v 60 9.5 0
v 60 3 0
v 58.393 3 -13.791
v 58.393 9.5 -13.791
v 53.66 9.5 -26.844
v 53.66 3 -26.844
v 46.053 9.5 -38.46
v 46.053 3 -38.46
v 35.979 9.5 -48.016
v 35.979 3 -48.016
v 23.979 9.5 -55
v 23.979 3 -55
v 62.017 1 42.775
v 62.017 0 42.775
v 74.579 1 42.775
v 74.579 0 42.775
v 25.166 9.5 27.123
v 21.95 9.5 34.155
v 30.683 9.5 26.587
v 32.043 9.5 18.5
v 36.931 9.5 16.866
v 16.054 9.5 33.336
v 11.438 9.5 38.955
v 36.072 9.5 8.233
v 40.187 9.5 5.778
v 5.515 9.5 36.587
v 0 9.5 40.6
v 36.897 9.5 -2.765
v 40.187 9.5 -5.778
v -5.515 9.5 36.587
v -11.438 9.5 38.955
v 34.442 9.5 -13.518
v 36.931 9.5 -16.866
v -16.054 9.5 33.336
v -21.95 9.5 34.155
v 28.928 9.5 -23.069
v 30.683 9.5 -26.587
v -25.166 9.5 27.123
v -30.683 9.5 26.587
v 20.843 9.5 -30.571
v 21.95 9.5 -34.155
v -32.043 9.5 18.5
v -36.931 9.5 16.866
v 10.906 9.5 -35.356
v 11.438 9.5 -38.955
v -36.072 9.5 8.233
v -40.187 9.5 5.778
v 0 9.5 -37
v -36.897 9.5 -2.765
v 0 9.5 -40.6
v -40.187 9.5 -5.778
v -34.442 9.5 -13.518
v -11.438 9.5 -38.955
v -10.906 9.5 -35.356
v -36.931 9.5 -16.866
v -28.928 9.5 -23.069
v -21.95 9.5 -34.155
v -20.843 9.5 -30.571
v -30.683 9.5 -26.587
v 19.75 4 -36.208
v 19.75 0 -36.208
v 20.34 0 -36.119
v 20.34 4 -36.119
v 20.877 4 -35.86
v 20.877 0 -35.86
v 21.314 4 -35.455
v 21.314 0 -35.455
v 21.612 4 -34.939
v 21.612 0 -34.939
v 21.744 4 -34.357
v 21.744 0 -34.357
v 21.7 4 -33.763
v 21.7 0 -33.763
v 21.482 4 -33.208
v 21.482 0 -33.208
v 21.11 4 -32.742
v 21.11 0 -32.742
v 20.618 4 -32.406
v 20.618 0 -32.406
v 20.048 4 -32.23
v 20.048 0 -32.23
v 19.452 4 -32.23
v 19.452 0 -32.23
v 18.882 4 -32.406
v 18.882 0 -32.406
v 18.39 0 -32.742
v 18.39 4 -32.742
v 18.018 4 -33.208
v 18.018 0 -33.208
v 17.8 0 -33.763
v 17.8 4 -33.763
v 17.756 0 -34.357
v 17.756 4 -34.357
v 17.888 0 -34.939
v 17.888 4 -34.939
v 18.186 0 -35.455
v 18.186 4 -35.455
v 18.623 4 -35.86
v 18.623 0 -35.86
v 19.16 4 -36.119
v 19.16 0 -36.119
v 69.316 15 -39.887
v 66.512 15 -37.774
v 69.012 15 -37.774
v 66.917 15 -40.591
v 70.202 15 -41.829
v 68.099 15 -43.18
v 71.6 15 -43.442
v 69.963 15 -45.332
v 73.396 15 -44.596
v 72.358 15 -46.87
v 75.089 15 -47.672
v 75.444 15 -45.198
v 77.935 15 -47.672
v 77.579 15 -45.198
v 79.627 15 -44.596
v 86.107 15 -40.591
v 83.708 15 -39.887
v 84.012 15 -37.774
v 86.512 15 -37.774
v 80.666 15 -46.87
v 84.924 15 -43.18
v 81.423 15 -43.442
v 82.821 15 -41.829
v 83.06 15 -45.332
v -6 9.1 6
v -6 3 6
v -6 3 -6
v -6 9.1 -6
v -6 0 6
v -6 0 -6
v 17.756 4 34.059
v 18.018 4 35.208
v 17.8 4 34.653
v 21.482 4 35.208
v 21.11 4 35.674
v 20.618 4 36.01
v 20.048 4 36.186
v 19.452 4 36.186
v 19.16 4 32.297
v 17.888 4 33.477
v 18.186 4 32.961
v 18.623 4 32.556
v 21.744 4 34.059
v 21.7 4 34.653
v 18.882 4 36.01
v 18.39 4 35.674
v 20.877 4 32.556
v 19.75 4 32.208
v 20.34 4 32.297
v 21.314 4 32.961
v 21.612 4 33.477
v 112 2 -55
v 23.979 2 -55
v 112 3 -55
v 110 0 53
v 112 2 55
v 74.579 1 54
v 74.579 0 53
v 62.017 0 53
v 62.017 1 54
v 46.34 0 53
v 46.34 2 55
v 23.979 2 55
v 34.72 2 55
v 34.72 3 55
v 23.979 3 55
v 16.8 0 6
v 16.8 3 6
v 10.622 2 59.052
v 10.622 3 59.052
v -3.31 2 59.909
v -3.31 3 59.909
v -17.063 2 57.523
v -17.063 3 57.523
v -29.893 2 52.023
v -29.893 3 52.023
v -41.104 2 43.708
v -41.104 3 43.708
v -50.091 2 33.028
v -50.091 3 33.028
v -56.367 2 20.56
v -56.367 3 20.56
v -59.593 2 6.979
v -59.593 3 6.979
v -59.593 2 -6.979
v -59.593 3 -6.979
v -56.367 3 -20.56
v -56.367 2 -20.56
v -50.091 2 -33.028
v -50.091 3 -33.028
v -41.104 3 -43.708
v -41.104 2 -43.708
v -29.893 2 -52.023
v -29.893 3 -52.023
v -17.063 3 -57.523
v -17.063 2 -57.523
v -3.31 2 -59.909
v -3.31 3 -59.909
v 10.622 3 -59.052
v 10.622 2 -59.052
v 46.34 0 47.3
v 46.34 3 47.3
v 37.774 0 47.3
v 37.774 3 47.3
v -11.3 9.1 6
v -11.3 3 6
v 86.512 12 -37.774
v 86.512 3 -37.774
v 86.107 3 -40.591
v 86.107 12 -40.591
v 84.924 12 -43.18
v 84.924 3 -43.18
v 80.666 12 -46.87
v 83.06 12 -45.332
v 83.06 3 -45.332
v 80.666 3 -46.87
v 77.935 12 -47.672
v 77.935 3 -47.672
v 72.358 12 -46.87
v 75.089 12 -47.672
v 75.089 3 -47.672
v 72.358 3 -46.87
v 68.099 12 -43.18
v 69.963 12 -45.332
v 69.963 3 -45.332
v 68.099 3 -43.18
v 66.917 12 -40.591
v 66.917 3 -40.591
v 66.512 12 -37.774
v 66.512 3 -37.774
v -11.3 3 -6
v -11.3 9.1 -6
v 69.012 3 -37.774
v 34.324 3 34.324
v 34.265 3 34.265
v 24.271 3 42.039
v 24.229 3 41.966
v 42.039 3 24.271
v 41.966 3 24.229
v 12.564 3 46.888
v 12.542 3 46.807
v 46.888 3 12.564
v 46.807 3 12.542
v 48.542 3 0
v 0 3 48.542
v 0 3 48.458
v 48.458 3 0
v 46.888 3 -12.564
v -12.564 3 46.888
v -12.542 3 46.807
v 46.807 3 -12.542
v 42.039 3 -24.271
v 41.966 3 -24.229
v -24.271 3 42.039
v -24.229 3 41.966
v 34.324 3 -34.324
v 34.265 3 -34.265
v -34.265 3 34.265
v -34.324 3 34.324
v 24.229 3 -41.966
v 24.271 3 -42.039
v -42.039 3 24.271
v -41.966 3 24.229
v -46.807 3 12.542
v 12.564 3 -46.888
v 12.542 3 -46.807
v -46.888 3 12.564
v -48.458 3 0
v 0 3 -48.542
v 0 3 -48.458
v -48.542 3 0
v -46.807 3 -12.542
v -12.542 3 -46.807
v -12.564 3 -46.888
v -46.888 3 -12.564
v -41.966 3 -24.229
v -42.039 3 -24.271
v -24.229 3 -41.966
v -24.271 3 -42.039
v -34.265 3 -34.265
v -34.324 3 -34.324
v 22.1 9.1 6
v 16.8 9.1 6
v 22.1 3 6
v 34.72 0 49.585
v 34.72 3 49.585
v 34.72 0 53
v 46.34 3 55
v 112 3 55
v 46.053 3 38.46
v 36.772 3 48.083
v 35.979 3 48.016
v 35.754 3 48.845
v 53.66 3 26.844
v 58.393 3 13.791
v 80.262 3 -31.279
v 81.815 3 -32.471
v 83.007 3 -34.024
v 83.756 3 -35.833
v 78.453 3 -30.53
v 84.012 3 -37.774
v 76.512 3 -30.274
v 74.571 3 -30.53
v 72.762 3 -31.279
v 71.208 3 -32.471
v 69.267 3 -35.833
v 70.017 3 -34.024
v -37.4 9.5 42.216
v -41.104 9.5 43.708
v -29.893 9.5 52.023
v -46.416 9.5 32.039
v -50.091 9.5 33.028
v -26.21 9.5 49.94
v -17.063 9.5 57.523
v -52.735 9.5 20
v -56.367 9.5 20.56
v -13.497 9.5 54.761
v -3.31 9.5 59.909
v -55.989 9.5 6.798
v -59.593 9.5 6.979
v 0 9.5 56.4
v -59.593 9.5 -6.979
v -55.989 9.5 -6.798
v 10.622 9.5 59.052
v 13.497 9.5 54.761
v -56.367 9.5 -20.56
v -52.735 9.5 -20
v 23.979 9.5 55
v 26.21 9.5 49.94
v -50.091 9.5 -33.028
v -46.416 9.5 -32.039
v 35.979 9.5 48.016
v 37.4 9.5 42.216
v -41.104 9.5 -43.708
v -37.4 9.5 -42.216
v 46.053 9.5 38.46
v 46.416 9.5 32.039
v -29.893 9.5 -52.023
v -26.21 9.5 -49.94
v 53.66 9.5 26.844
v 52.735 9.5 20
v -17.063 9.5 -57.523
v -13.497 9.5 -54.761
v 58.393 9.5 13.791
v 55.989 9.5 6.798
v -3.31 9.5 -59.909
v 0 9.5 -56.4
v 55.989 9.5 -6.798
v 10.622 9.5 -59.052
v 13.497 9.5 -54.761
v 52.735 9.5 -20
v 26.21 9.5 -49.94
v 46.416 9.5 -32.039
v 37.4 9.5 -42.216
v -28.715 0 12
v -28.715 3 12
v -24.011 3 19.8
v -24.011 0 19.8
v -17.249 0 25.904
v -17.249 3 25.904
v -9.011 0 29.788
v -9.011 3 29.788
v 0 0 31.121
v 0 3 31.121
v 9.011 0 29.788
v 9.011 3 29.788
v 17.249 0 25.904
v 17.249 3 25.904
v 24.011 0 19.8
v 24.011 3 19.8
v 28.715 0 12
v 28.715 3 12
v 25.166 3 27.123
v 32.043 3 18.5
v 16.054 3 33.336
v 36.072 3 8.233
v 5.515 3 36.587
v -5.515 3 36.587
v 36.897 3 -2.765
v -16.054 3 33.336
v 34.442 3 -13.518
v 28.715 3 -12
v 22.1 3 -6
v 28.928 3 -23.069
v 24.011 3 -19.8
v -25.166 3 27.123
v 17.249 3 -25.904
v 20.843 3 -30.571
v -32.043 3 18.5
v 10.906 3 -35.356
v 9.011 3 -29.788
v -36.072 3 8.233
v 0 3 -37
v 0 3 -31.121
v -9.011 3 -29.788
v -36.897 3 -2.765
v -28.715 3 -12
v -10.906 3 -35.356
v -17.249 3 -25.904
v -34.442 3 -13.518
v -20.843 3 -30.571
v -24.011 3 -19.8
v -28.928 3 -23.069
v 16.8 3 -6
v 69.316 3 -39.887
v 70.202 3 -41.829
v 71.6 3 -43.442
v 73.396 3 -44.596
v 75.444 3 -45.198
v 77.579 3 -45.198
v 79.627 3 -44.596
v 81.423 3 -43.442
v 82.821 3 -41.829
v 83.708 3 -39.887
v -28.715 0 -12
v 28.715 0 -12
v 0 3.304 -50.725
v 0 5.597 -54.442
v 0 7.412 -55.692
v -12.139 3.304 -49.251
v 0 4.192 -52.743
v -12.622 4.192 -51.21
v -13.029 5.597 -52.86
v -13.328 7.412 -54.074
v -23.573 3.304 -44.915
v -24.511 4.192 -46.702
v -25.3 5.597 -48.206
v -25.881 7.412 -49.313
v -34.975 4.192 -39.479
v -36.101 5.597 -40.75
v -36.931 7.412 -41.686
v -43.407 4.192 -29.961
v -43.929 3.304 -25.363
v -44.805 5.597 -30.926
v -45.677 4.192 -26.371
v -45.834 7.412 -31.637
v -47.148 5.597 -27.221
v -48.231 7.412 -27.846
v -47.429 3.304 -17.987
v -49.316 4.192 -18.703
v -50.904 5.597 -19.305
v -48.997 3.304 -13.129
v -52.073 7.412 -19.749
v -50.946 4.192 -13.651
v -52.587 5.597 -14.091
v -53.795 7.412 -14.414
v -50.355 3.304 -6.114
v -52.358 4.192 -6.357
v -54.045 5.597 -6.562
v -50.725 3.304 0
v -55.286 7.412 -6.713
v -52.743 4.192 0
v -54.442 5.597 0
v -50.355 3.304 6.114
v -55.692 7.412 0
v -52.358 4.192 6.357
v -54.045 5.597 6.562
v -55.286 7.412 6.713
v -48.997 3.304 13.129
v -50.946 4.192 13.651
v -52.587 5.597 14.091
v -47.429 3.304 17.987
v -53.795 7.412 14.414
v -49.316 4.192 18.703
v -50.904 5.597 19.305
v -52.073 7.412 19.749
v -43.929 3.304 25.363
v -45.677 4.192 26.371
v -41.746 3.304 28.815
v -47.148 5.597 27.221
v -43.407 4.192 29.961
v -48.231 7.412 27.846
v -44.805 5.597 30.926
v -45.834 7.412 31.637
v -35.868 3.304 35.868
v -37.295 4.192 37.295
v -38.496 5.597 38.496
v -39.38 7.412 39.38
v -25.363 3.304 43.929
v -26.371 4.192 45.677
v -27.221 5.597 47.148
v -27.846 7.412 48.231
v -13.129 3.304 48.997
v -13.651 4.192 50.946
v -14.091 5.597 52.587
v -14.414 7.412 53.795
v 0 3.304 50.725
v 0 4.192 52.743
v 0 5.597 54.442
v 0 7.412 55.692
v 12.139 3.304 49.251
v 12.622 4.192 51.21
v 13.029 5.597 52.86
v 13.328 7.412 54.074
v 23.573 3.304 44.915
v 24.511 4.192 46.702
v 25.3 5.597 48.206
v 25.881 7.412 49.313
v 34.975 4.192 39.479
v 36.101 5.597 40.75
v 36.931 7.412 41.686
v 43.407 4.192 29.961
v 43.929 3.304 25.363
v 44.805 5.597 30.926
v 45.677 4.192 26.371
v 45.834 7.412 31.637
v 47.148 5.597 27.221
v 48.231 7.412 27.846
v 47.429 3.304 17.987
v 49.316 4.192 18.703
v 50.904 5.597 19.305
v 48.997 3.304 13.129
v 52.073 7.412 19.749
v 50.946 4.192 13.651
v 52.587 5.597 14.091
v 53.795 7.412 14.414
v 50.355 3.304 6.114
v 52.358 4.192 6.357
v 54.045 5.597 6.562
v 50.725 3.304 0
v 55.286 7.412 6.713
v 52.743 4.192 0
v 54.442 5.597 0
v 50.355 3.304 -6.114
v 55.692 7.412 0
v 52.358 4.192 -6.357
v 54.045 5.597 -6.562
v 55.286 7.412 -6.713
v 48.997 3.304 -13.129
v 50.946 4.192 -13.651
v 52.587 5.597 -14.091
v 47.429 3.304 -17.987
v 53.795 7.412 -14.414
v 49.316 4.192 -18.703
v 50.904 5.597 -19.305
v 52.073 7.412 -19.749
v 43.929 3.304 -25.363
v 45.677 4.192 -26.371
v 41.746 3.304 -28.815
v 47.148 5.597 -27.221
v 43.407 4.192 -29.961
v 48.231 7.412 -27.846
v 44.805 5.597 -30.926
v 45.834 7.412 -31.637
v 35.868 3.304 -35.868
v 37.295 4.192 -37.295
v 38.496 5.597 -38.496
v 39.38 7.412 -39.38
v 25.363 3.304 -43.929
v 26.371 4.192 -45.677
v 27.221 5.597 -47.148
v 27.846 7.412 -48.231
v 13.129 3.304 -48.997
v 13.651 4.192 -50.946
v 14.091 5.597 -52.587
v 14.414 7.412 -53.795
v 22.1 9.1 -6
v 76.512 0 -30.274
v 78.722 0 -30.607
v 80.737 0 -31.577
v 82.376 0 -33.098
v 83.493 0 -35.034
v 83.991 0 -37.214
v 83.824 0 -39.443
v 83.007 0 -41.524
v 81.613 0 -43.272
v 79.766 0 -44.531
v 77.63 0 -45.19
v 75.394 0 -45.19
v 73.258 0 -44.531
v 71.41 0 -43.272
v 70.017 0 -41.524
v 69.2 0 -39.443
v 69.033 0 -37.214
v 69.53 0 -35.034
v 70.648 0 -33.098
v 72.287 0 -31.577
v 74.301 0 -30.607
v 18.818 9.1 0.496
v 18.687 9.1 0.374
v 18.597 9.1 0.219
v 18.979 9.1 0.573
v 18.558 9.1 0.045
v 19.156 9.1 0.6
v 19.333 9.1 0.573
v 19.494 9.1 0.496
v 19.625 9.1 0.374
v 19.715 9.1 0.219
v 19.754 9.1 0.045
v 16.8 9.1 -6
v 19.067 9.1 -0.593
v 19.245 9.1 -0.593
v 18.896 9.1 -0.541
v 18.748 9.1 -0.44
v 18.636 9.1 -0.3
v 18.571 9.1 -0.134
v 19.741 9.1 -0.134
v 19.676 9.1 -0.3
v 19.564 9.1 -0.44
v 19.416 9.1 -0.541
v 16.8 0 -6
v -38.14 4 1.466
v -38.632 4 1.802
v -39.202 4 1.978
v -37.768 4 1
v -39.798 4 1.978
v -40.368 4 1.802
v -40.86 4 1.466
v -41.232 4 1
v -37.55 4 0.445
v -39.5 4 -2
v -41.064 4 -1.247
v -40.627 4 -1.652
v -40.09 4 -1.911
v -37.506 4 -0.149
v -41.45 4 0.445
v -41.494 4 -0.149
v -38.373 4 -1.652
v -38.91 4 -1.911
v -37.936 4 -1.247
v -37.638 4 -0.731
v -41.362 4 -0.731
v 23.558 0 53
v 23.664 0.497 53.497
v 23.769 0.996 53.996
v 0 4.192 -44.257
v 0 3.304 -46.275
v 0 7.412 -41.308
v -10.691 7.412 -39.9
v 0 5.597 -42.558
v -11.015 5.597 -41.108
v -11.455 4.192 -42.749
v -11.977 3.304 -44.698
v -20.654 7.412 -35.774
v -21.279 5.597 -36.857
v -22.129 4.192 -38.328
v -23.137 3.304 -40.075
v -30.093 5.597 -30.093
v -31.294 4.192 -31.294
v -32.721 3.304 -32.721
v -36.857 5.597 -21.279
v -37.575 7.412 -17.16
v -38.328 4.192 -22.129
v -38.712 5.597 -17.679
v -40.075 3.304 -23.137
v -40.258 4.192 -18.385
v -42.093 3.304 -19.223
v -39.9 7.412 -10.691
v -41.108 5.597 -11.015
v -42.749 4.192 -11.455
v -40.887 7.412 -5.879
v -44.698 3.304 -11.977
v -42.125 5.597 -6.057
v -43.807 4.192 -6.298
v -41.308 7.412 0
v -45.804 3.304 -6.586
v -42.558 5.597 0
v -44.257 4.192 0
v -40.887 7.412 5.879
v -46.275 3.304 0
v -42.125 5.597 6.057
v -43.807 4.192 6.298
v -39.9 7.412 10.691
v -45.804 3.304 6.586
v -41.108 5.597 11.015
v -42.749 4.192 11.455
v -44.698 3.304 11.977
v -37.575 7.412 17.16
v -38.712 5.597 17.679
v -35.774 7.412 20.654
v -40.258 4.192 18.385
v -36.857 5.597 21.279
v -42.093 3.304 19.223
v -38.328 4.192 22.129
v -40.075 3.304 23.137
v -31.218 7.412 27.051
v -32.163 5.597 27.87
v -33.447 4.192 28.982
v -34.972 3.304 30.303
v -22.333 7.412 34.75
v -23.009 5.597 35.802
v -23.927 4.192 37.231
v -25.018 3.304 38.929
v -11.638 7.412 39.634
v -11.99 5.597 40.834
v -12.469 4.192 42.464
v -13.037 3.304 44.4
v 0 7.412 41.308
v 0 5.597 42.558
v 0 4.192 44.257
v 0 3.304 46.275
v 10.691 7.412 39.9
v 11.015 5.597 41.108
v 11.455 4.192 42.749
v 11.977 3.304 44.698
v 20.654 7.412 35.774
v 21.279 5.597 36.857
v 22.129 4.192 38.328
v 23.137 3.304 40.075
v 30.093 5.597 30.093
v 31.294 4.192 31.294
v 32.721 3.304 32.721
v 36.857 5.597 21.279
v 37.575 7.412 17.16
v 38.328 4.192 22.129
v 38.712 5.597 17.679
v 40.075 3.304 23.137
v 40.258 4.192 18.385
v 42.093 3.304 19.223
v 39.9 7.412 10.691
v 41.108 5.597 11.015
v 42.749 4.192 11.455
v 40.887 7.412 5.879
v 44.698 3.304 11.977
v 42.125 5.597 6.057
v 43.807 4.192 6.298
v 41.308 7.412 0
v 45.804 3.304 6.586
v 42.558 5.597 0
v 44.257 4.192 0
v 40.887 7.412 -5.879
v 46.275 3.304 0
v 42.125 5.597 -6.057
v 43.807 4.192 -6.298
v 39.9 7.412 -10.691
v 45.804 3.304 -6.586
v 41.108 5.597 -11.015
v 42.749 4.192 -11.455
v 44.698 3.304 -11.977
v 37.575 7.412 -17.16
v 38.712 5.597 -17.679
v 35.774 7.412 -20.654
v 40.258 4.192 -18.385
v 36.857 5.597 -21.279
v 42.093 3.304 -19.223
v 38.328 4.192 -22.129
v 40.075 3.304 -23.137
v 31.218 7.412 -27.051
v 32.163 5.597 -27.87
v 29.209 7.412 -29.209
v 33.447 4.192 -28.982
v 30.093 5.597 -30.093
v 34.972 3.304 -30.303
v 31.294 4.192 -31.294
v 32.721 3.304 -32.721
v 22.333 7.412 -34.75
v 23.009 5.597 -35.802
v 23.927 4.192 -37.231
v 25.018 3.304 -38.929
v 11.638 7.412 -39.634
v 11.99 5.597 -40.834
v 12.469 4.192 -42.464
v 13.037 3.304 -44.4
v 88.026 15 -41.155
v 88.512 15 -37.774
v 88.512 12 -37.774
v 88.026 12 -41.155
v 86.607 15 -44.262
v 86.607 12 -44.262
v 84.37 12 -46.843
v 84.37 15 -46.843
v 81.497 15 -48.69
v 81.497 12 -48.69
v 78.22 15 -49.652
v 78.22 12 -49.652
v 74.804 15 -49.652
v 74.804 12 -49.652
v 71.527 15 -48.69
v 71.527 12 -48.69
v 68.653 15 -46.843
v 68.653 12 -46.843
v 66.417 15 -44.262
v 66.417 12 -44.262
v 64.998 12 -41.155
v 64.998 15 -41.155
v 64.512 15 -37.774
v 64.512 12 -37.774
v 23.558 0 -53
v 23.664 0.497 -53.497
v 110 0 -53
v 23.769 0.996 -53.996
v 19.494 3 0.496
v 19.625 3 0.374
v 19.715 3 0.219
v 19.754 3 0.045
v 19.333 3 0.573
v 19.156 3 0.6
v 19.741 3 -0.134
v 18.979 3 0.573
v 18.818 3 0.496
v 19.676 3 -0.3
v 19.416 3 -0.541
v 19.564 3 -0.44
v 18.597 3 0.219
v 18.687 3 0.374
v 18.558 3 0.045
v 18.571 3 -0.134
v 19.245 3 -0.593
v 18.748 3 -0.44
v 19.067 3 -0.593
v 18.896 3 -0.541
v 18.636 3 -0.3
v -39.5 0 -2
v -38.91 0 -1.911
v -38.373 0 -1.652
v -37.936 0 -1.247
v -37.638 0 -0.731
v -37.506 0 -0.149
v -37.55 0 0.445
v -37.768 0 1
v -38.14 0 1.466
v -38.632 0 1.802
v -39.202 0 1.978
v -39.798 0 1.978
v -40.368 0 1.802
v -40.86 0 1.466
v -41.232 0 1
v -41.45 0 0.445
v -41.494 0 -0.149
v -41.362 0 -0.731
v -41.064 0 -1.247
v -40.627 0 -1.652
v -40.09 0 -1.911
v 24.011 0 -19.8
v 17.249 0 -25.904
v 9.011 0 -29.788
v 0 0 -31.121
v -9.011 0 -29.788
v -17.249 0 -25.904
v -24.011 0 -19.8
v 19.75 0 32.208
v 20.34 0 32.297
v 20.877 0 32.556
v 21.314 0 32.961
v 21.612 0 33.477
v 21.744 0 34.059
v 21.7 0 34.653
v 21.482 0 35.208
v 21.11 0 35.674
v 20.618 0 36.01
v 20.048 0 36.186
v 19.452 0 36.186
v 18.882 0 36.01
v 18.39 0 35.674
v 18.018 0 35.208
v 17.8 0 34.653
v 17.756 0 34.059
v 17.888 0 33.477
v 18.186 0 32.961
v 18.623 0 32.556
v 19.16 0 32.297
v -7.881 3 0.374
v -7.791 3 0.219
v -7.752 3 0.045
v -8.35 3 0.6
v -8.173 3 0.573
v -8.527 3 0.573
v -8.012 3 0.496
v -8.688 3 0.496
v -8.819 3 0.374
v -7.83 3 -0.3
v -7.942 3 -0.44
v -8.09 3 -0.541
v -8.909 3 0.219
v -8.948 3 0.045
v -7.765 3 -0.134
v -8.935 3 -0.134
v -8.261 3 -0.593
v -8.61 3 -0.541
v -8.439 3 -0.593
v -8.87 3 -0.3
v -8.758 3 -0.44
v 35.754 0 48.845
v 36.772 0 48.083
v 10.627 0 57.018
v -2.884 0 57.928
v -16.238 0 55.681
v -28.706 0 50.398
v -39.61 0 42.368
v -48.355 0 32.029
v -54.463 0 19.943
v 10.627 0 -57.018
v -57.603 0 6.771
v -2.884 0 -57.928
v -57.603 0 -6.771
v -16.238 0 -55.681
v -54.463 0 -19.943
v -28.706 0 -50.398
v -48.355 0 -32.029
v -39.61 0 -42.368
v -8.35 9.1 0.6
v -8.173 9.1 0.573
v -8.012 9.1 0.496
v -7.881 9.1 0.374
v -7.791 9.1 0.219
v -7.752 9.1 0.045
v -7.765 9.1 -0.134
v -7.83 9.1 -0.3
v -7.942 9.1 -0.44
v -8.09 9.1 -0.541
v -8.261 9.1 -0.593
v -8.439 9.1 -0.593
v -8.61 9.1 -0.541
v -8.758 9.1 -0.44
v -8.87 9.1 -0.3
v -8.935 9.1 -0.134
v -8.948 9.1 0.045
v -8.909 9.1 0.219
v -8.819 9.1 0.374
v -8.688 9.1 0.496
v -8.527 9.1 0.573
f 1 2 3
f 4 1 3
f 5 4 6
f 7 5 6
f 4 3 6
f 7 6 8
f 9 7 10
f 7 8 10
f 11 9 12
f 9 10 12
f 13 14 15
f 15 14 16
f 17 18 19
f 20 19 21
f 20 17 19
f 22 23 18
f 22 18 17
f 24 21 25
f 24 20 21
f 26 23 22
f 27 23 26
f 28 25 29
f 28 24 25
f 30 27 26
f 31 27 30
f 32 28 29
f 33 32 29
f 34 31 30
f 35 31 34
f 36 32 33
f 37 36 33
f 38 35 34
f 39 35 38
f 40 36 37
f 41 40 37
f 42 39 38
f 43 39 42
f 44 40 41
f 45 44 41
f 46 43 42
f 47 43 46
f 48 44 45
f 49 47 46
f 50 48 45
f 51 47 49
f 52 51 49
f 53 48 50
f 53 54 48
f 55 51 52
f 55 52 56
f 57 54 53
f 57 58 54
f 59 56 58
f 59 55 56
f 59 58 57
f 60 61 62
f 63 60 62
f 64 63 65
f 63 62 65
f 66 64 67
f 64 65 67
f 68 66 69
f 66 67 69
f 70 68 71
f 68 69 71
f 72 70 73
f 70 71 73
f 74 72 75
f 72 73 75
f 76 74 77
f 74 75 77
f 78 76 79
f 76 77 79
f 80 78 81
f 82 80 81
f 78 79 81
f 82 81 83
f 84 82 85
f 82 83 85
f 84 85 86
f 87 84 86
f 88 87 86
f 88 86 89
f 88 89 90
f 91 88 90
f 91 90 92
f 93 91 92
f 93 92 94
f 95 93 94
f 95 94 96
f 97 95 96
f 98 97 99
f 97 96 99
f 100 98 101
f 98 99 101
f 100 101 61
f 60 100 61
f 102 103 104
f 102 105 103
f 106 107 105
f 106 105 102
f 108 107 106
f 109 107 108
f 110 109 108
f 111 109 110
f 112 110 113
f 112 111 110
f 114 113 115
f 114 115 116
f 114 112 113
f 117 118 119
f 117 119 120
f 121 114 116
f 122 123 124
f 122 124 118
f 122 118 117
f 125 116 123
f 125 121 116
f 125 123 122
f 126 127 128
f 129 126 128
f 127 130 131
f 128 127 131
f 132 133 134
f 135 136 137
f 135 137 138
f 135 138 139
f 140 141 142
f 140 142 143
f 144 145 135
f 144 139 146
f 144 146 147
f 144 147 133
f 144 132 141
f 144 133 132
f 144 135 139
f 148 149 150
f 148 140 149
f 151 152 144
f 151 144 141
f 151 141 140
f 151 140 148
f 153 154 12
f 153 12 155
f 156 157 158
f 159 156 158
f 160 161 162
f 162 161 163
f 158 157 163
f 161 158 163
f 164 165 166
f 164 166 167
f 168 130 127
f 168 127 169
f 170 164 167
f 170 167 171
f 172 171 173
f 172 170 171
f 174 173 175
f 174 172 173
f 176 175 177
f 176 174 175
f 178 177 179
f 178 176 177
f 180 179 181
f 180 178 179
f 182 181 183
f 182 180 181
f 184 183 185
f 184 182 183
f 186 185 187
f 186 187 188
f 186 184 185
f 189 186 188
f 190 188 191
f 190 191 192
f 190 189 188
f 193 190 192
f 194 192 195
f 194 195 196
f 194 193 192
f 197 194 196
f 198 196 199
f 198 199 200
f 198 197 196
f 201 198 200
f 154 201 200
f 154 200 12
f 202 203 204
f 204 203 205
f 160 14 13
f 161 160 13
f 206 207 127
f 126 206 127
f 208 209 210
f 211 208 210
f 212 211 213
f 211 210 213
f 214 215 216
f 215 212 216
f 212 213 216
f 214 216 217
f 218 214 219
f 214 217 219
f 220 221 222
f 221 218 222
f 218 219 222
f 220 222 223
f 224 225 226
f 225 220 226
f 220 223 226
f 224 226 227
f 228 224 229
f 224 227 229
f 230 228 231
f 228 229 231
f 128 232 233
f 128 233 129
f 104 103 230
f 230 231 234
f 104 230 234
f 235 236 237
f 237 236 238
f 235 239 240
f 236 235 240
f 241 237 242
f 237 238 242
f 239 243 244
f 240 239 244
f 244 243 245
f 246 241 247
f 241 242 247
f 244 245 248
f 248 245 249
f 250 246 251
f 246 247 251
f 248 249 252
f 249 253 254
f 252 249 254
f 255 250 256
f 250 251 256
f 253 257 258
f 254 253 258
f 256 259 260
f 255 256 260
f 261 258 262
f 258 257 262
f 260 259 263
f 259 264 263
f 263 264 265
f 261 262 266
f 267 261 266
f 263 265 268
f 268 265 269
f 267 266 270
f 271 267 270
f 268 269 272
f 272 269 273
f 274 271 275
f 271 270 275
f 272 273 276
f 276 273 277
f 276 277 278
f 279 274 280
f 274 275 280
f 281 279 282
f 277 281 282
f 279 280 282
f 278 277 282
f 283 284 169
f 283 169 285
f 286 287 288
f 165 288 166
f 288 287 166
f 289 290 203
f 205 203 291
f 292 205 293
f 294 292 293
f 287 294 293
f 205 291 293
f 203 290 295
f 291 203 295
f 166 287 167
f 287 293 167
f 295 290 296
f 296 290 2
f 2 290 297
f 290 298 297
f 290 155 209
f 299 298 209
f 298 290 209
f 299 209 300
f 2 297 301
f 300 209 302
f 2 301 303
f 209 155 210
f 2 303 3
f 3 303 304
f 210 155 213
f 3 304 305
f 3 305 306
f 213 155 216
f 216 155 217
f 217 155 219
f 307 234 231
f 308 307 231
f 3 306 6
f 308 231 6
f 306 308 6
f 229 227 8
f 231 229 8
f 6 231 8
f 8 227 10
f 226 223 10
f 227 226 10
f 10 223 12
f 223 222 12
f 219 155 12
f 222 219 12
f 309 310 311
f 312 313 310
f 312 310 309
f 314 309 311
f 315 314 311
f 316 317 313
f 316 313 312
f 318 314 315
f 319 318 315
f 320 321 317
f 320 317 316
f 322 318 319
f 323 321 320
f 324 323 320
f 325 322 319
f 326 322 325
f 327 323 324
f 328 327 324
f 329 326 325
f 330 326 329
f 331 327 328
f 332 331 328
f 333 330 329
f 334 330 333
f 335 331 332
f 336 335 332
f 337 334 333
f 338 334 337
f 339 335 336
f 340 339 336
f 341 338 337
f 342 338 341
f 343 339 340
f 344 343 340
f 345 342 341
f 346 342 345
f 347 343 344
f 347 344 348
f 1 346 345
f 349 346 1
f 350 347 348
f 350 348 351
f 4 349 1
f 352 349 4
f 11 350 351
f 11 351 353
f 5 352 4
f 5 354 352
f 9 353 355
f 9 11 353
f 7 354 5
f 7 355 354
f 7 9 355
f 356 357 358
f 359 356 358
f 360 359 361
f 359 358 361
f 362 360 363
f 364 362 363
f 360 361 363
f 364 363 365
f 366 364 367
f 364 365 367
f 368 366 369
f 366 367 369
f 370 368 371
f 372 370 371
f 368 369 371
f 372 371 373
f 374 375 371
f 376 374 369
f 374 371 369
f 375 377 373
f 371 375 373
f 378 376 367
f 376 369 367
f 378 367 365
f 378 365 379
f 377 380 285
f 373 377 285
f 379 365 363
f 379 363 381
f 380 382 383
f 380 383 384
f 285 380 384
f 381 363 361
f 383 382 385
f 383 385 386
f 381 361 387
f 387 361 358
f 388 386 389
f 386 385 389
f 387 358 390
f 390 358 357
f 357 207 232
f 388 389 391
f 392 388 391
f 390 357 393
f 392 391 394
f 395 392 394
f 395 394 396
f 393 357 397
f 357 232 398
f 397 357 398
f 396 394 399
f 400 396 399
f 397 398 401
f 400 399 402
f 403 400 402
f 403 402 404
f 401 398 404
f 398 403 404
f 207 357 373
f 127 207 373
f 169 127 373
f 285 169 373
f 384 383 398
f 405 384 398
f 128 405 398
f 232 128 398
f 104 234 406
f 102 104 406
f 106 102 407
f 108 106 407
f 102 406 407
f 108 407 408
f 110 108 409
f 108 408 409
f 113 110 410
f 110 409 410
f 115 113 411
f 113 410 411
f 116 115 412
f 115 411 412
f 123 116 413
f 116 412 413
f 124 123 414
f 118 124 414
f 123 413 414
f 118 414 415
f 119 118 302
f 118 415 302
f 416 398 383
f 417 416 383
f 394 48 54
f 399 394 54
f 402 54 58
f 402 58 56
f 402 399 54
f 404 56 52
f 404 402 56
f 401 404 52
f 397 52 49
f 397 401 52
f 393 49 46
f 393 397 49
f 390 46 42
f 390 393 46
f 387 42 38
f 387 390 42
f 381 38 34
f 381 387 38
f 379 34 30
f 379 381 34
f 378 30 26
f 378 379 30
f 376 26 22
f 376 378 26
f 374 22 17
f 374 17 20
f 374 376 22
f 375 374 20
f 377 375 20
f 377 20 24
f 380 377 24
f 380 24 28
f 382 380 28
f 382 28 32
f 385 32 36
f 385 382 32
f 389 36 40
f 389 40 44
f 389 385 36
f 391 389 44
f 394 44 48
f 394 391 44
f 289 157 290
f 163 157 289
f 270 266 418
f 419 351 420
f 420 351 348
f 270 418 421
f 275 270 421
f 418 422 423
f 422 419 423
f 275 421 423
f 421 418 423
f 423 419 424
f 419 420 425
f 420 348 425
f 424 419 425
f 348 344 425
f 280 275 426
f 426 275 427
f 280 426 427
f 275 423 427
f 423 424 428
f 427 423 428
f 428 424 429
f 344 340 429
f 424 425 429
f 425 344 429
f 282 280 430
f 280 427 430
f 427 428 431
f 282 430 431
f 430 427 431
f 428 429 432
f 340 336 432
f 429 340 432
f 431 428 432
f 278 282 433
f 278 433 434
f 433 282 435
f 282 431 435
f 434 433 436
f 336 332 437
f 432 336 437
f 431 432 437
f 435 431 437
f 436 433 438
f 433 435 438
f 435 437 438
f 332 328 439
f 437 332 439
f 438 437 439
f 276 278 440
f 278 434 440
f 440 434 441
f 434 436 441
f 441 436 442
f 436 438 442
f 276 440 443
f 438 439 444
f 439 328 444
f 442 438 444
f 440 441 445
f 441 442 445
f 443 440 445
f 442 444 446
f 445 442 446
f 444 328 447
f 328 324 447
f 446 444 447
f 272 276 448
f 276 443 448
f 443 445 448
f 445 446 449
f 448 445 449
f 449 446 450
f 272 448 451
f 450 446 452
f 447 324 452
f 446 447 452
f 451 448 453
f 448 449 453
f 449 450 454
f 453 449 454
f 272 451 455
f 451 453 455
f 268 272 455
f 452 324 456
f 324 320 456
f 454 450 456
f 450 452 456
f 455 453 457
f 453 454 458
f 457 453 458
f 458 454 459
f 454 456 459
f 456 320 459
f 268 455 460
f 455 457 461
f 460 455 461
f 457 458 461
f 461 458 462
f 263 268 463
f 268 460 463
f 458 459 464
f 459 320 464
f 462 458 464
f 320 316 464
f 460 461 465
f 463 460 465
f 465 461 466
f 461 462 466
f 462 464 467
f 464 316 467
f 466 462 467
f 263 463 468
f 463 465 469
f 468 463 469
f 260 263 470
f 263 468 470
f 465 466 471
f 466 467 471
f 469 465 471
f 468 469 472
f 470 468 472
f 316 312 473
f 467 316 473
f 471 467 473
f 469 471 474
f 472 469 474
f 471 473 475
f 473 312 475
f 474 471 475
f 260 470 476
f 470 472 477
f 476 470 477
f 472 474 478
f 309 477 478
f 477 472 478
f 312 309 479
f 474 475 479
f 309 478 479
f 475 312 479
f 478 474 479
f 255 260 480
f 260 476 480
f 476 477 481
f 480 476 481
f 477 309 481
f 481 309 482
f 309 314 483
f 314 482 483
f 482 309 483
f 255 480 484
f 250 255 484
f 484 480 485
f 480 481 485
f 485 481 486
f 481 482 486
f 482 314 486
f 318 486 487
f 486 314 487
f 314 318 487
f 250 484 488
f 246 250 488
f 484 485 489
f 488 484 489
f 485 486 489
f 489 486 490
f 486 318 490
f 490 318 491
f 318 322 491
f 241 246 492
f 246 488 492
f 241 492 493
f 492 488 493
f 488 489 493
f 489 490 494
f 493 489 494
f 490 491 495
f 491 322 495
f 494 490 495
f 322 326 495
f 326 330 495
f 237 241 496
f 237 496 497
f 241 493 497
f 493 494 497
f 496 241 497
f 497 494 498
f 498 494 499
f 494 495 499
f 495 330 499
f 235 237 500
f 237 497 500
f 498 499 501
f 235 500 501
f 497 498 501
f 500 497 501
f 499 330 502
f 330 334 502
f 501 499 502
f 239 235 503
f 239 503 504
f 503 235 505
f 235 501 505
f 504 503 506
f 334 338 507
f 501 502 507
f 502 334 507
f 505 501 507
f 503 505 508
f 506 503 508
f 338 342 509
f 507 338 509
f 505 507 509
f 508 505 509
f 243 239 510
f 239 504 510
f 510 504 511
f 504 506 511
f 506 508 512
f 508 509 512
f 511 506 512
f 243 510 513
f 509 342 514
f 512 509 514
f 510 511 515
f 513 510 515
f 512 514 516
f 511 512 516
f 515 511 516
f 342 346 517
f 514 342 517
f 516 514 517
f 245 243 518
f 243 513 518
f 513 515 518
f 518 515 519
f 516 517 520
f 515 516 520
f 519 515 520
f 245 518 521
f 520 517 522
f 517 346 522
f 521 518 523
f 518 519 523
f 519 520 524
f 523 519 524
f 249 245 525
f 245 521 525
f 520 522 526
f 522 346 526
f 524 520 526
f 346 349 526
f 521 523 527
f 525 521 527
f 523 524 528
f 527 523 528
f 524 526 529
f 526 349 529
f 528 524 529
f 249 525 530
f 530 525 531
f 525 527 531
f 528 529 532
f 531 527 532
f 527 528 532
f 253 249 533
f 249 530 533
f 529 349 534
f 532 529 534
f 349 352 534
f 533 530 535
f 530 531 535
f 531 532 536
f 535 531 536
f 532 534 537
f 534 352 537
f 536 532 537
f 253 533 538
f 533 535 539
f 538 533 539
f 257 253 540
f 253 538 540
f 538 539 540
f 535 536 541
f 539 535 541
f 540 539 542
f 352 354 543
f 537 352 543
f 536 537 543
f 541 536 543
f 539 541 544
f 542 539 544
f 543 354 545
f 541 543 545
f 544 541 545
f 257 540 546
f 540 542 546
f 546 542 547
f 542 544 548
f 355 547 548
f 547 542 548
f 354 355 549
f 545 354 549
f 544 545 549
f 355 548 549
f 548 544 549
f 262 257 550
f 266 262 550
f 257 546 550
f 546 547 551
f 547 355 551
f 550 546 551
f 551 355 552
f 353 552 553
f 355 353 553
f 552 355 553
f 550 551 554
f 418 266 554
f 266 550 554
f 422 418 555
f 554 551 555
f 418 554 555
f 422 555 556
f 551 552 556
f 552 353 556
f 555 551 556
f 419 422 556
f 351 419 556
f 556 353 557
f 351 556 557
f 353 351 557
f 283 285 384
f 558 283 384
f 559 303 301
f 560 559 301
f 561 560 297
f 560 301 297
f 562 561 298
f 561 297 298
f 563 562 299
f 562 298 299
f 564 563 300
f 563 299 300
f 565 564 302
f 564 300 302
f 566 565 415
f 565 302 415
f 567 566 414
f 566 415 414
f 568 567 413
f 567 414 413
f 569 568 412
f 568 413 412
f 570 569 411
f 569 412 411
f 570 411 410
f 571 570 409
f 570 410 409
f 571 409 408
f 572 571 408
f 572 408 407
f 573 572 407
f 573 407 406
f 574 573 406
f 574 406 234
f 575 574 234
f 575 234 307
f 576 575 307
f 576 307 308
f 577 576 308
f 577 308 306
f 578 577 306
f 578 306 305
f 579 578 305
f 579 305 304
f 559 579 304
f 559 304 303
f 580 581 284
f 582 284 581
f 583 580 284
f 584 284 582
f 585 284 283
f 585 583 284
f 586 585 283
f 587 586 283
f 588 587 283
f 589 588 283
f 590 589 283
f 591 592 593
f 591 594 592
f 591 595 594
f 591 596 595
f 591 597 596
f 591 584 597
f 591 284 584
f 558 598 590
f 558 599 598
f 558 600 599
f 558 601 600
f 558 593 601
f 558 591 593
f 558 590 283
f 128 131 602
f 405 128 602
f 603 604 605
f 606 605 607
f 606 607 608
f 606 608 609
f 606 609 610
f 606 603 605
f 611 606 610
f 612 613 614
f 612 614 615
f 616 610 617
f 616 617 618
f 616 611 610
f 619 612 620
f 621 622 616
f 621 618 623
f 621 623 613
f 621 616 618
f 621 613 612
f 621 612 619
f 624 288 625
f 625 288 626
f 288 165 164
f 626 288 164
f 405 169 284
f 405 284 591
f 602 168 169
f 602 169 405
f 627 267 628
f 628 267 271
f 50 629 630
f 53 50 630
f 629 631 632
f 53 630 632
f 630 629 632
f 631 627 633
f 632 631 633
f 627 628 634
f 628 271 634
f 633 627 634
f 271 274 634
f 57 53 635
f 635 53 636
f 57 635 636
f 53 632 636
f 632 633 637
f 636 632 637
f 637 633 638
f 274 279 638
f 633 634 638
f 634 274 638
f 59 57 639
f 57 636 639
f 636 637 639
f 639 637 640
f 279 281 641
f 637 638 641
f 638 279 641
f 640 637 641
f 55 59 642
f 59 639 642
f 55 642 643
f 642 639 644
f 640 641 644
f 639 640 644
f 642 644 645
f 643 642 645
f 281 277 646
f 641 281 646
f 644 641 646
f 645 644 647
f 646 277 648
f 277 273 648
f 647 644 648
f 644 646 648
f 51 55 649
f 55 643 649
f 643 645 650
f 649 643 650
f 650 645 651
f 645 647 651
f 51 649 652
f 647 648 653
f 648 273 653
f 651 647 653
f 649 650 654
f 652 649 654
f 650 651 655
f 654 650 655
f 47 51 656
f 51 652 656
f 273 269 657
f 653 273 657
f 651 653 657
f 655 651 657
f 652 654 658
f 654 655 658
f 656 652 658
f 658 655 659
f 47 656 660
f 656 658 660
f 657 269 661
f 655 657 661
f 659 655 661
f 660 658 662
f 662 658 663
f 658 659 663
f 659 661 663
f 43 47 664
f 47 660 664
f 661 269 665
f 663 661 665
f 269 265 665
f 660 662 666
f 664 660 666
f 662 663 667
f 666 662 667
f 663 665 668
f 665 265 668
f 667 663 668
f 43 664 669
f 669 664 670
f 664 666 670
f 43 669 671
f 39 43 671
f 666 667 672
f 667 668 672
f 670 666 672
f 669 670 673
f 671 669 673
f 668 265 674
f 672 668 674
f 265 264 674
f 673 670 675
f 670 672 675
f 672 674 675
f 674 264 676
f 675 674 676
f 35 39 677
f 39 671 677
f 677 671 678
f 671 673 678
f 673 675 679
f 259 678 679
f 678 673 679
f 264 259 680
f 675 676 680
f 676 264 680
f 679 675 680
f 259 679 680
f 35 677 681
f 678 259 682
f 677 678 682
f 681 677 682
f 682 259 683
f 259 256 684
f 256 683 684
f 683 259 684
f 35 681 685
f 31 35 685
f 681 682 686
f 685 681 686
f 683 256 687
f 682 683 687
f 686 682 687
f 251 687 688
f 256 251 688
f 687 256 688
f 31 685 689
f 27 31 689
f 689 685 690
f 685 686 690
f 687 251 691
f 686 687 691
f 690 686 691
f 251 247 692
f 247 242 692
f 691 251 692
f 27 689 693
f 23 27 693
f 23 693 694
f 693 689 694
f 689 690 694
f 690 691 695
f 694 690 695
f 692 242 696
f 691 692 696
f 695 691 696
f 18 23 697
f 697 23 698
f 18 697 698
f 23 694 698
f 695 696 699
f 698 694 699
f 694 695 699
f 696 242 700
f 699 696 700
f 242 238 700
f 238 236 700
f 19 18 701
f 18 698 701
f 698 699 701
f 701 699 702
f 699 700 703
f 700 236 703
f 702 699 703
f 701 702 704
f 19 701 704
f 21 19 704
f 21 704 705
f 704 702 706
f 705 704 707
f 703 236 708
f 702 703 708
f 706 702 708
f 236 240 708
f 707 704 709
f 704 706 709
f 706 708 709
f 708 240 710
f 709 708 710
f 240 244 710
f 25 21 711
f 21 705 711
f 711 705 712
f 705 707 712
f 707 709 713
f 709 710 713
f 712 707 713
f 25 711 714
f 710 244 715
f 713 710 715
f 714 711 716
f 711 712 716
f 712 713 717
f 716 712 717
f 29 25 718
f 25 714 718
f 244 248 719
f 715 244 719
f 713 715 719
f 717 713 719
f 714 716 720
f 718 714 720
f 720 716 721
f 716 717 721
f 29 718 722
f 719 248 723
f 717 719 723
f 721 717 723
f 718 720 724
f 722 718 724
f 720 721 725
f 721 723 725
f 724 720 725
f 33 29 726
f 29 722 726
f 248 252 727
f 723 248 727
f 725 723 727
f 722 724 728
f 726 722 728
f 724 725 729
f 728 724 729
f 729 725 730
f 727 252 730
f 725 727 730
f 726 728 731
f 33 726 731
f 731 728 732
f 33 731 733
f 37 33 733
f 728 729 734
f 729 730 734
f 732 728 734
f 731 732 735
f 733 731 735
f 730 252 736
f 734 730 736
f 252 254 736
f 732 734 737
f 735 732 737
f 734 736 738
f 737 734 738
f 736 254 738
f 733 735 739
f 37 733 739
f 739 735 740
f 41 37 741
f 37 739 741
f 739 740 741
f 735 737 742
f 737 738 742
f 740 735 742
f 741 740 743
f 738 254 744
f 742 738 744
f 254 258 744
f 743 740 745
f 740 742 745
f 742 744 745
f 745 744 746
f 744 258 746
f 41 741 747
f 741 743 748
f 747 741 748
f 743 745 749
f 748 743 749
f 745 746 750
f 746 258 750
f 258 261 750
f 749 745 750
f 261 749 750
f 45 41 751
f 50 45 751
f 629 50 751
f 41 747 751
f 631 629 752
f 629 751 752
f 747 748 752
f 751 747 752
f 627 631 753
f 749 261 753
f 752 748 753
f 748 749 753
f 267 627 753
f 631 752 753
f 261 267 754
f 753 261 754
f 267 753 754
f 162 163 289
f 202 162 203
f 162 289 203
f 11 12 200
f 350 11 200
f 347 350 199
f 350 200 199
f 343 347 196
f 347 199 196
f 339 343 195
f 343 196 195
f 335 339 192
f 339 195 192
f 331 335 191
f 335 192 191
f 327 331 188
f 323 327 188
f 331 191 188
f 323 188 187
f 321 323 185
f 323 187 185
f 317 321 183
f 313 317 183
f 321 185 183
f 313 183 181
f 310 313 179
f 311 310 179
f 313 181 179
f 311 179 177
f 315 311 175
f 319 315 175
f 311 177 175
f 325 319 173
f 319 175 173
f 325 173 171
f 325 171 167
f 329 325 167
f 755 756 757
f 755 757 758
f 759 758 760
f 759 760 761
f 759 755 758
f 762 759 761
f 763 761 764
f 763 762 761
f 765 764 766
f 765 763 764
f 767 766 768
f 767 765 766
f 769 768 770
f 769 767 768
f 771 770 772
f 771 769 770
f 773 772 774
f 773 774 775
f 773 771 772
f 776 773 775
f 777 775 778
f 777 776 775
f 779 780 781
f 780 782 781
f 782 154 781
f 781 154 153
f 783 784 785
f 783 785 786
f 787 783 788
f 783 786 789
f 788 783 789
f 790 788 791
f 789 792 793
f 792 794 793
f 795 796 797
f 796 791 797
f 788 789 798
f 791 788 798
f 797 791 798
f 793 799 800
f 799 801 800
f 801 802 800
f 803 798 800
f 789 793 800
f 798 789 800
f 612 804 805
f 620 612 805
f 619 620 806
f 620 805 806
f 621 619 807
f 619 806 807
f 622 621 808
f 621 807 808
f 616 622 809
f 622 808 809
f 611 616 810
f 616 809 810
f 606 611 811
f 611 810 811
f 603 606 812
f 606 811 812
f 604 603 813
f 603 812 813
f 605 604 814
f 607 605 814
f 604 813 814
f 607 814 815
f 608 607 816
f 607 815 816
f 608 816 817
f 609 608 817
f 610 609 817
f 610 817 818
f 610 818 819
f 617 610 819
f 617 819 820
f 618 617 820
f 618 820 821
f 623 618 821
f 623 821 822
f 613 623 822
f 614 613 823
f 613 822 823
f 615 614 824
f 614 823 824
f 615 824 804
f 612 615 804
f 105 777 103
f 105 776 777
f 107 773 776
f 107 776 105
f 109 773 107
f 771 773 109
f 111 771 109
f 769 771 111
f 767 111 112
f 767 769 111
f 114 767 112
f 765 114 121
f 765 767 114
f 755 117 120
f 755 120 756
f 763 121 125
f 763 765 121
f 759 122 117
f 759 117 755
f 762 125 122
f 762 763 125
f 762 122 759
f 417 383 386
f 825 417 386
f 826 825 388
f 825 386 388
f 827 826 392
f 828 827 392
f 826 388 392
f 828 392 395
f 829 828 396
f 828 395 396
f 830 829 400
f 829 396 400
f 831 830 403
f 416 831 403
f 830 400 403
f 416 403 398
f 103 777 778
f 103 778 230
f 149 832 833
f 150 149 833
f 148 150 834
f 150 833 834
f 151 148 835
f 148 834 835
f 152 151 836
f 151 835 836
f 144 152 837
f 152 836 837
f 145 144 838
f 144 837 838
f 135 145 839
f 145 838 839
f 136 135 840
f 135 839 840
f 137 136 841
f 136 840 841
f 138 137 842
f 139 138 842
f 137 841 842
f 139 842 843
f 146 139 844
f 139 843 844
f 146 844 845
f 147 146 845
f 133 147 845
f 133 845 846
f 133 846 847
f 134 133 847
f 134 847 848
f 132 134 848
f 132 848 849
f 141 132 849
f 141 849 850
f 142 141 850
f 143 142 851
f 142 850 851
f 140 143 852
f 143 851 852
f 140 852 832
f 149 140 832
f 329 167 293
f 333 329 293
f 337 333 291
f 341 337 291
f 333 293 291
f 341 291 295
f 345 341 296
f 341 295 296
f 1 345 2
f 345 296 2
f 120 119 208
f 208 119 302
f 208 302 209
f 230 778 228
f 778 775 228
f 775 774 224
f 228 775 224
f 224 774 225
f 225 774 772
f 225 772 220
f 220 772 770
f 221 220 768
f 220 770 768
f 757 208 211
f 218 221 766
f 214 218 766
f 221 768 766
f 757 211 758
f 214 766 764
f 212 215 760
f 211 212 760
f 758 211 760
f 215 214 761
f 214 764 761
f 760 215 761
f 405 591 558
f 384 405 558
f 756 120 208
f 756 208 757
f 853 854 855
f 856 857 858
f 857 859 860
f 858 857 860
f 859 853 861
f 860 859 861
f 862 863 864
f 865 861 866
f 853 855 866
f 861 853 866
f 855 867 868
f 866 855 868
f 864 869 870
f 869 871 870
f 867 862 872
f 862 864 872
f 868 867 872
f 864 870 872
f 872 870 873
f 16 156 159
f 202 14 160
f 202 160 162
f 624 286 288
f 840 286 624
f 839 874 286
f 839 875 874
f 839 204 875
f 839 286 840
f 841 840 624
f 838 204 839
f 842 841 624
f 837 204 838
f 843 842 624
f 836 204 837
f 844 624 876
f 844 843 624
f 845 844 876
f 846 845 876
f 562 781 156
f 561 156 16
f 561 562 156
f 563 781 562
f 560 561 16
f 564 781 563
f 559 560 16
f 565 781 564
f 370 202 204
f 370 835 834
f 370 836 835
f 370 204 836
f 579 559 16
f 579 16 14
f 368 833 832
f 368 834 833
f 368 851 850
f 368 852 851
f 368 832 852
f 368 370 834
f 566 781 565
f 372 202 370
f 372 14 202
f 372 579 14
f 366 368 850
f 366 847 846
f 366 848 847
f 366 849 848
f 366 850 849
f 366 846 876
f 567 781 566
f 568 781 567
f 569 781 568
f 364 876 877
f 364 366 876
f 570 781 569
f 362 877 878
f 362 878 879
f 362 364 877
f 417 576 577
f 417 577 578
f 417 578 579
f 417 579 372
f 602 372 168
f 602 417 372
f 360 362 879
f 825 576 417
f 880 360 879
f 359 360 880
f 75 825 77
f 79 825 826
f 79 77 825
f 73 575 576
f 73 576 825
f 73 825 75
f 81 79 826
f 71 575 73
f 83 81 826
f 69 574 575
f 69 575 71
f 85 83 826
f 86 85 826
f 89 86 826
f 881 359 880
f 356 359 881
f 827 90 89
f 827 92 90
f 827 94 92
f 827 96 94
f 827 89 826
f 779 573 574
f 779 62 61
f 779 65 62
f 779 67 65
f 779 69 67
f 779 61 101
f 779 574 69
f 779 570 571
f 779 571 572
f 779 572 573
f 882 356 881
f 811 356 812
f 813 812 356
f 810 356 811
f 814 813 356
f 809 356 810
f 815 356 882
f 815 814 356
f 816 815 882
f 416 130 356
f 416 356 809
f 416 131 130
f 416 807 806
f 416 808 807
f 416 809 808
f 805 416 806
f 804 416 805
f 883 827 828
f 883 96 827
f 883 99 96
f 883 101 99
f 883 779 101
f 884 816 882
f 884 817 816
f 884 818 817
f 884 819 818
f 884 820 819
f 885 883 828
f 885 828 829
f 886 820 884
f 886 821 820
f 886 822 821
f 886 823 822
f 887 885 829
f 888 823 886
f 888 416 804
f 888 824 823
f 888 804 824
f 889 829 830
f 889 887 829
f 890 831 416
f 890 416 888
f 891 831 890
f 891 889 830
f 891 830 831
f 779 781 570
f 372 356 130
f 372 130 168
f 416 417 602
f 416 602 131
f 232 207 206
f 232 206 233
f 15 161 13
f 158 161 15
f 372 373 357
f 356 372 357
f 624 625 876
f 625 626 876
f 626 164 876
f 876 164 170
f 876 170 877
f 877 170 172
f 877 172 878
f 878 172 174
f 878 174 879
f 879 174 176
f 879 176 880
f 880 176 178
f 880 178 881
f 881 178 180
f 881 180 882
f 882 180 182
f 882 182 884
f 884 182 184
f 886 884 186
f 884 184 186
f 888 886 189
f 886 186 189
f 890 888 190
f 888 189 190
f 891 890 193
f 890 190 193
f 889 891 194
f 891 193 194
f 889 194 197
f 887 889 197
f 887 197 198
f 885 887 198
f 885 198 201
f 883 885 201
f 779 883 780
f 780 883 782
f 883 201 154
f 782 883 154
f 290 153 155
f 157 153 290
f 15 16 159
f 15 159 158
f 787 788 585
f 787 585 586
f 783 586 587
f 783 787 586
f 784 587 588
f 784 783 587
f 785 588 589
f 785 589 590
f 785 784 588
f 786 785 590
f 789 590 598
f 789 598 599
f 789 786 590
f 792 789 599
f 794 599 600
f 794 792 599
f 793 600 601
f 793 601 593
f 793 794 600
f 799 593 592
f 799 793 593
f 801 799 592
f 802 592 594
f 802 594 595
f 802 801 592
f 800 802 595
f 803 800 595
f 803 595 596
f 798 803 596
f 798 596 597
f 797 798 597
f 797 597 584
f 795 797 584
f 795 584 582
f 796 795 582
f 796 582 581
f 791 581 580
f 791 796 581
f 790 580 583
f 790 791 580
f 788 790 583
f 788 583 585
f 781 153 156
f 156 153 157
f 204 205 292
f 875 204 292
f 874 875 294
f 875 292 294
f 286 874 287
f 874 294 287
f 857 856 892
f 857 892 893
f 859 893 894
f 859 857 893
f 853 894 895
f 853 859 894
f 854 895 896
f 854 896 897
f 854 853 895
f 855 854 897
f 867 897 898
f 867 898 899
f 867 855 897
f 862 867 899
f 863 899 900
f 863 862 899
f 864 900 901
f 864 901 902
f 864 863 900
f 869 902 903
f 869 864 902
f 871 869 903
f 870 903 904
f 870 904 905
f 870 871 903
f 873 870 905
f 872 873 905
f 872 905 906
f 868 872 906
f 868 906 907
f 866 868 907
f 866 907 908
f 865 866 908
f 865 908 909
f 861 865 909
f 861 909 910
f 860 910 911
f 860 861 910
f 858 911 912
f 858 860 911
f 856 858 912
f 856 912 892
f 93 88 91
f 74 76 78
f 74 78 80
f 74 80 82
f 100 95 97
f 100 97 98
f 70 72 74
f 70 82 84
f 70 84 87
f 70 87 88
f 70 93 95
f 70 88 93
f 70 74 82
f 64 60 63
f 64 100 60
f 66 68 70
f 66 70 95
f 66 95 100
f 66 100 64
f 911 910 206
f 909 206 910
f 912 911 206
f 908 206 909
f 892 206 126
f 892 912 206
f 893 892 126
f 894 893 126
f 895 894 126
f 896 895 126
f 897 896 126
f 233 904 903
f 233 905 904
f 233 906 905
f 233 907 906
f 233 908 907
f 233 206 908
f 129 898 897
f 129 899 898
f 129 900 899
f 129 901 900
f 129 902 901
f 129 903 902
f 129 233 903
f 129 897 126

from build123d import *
from build123d.topology import SkipClean

# Parameters (mm, degrees)
SKETCH1_W           = 22.8
SKETCH1_H           = 12
BOSS_EXTRUDE1_DEPTH = 3
SKETCH2_R           = 56.4
SKETCH2_R_2         = 40.6
SKETCH2_R_3         = 37
SKETCH2_W           = 22.8
SKETCH2_H           = 12
BOSS_EXTRUDE2_DEPTH = 6.5
FILLET1_R           = 8
SKETCH3_W           = 5.3
SKETCH3_H           = 12
SKETCH3_R           = 0.6
BOSS_EXTRUDE3_DEPTH = 6.1
CHAMFER1_SIZE       = 2
SKETCH4_W           = 12.561985035
SKETCH4_H           = 13.525375378
CUT_EXTRUDE1_DEPTH  = 1
SKETCH5_R           = 2
CUT_EXTRUDE2_DEPTH  = 4
CUT_EXTRUDE3_DEPTH  = 11.9
SKETCH7_R           = 7.5
CUT_EXTRUDE4_DEPTH  = 10
BOSS_EXTRUDE4_DEPTH = 12
BOSS_EXTRUDE5_DEPTH = 3
CUT_EXTRUDE5_DEPTH  = 12


with BuildPart() as part:
    # Sketch1 → Boss-Extrude1 (new body)
    with BuildSketch(Plane(origin=(0, 0, 0), x_dir=(1, 0, 0), z_dir=(0, 1, 0))):
        with BuildLine():
            Line((112, 55), (112, -55))
            Line((112, -55), (23.979157617, -55))
            ThreePointArc((23.979157617, -55), (-60, 0), (23.979157617, 55))
            Line((23.979157617, 55), (112, 55))
        make_face()
        with Locations((5.4, 0)):
            Rectangle(SKETCH1_W, SKETCH1_H, mode=Mode.SUBTRACT)
    extrude(amount=BOSS_EXTRUDE1_DEPTH)

    # Sketch2 → Boss-Extrude2 (add)
    # profile 1 of 4: a face of its own
    with SkipClean():  # the faces are left unmerged after this step: merging them gives an invalid solid
        with BuildSketch(Plane(origin=(0, 3, 0), x_dir=(1, 0, 0), z_dir=(0, 1, 0))):
            with BuildLine():
                ThreePointArc((23.979157617, -55), (50.193373352, -32.872865277), (60, 0))
                ThreePointArc((60, 0), (50.193373352, 32.872865277), (23.979157617, 55))
                ThreePointArc((23.979157617, 55), (-60, 0), (23.979157617, -55))
            make_face()
            with Locations(Location((0, 0, 0), (0, 0, 90))):
                Circle(SKETCH2_R, mode=Mode.SUBTRACT)
        # profile 2 of 4: a face of its own
        with BuildSketch(Plane(origin=(0, 3, 0), x_dir=(1, 0, 0), z_dir=(0, 1, 0))):
            with Locations(Location((0, 0, 0), (0, 0, 90))):
                Circle(SKETCH2_R_2)
            with Locations(Location((0, 0, 0), (0, 0, 90))):
                Circle(SKETCH2_R_3, mode=Mode.SUBTRACT)
        # profile 3 of 4: a face of its own
        with BuildSketch(Plane(origin=(0, 3, 0), x_dir=(1, 0, 0), z_dir=(0, 1, 0))):
            with Locations((5.4, 0)):
                Rectangle(SKETCH2_W, SKETCH2_H)
        # profile 4 of 4: a face of its own
        with BuildSketch(Plane(origin=(0, 3, 0), x_dir=(1, 0, 0), z_dir=(0, 1, 0))):
            with Locations((5.4, 0)):
                Rectangle(SKETCH2_W, SKETCH2_H)
        extrude(amount=BOSS_EXTRUDE2_DEPTH)


with BuildPart() as boss_extrude2_kept_piece:
    # of the separate pieces the step leaves, the one the design keeps (boss_extrude2_pieces_kept)
    add(part.part.solids().sort_by_distance((23.979157617, 0, -55))[0])

    # Fillet1
    # the kernel refuses this fillet: 8 mm, written as the material it adds along each edge
    with BuildSketch(Plane(origin=(0, 3, 0), x_dir=(0, 0, -1), z_dir=(1, 0, 0))) as fillet1_piece_1:
        with BuildLine():
            CenterArc((48.541883177, 8), FILLET1_R, 270, 79.193077125)
            Line((48.541883177, 0), (48.541883177, -0.16))
            Line((48.541883177, -0.16), (56.4, -0.16))
            Line((56.4, -0.16), (56.56, 0))
            ThreePointArc((56.56, 0), (56.56, 3.25), (56.557162336, 6.47))
            Line((56.557162336, 6.47), (56.4, 6.5))
        make_face()
    revolve(axis=Axis((0, 3, 0), (0, 1, 0)))
    with BuildSketch(Plane(origin=(0, 3, 0), x_dir=(0, 0, -1), z_dir=(1, 0, 0))) as fillet1_piece_2:
        with BuildLine():
            CenterArc((48.458116823, 8), FILLET1_R, 190.806922875, 79.193077125)
            Line((40.6, 6.5), (40.442837664, 6.47))
            ThreePointArc((40.442837664, 6.47), (40.44, 3.25), (40.44, 0))
            Line((40.44, 0), (40.6, -0.16))
            Line((40.6, -0.16), (48.458116823, -0.16))
            Line((48.458116823, -0.16), (48.458116823, 0))
        make_face()
    revolve(axis=Axis((0, 3, 0), (0, 1, 0)))

    # Sketch3 → Boss-Extrude3 (add)
    # profile 1 of 2: a face of its own
    with BuildSketch(Plane(origin=(0, 3, 0), x_dir=(1, 0, 0), z_dir=(0, 1, 0))):
        with Locations((-8.65, 0)):
            Rectangle(SKETCH3_W, SKETCH3_H)
        with Locations(Location((-8.35, 0, 0), (0, 0, 270))):
            Circle(SKETCH3_R, mode=Mode.SUBTRACT)
    # profile 2 of 2: a face of its own
    with BuildSketch(Plane(origin=(0, 3, 0), x_dir=(1, 0, 0), z_dir=(0, 1, 0))):
        with Locations((19.45, 0)):
            Rectangle(SKETCH3_W, SKETCH3_H)
        with Locations(Location((19.156, 0, 0), (0, 0, 270))):
            Circle(SKETCH3_R, mode=Mode.SUBTRACT)
    extrude(amount=BOSS_EXTRUDE3_DEPTH)

    # Chamfer1
    chamfer1_edges = [boss_extrude2_kept_piece.edges().sort_by_distance(p)[0] for p in [
        (112, 0, 0),
        (67.989578808, 0, 55),
        (-60, 0, 0),
        (67.989578808, 0, -55),
    ]]
    chamfer(chamfer1_edges, length=CHAMFER1_SIZE)

    # Sketch4 → Cut-Extrude1 (cut)
    with SkipClean():  # the faces are left unmerged after this step: merging them gives an invalid solid
        with BuildSketch(Plane.XZ):
            with Locations((68.298400031, 49.537890064)):
                Rectangle(SKETCH4_W, SKETCH4_H)
        extrude(amount=-CUT_EXTRUDE1_DEPTH, mode=Mode.SUBTRACT)

    # Sketch5 → Cut-Extrude2 (cut)
    with SkipClean():  # the faces are left unmerged after this step: merging them gives an invalid solid
        with BuildSketch(Plane.XZ):
            with Locations(Location((-39.5, 0, 0), (0, 0, 270))):
                Circle(SKETCH5_R)
            with Locations(Location((19.75, 34.208003449, 0), (0, 0, 270))):
                Circle(SKETCH5_R)
            with Locations(Location((19.75, -34.208003449, 0), (0, 0, 270))):
                Circle(SKETCH5_R)
        extrude(amount=-CUT_EXTRUDE2_DEPTH, mode=Mode.SUBTRACT)

    # Sketch6 → Cut-Extrude3 (cut)
    with SkipClean():  # the faces are left unmerged after this step: merging them gives an invalid solid
        with BuildSketch(Plane(origin=(0, 3, 0), x_dir=(1, 0, 0), z_dir=(0, 1, 0))):
            with BuildLine():
                Line((-28.714918284, 12), (0, 12))
                Line((0, 12), (28.714918284, 12))
                ThreePointArc((28.714918284, 12), (0, 31.121480236), (-28.714918284, 12))
            make_face()
            with BuildLine():
                Line((28.714918284, -12), (-28.714918284, -12))
                ThreePointArc((-28.714918284, -12), (0, -31.121480236), (28.714918284, -12))
            make_face()
        extrude(amount=-CUT_EXTRUDE3_DEPTH, mode=Mode.SUBTRACT)

    # Sketch7 → Cut-Extrude4 (cut)
    with SkipClean():  # the faces are left unmerged after this step: merging them gives an invalid solid
        with BuildSketch(Plane(origin=(0, 3, 0), x_dir=(1, 0, 0), z_dir=(0, 1, 0))):
            with Locations(Location((76.511791502, 37.774024263, 0), (0, 0, 270))):
                Circle(SKETCH7_R)
        extrude(amount=-CUT_EXTRUDE4_DEPTH, mode=Mode.SUBTRACT)

    # Sketch7<3> → Boss-Extrude4 (add)
    with SkipClean():  # the faces are left unmerged after this step: merging them gives an invalid solid
        with BuildSketch(Plane(origin=(0, 3, 0), x_dir=(1, 0, 0), z_dir=(0, 1, 0))):
            with BuildLine():
                Line((66.511791502, 37.774024263), (69.011791502, 37.774024263))
                ThreePointArc((69.011791502, 37.774024263), (76.511791502, 45.274024263), (84.011791502, 37.774024263))
                Line((84.011791502, 37.774024263), (86.511791502, 37.774024263))
                ThreePointArc((86.511791502, 37.774024263), (76.511791502, 47.774024263), (66.511791502, 37.774024263))
            make_face()
        extrude(amount=BOSS_EXTRUDE4_DEPTH)

    # Sketch8 → Boss-Extrude5 (add)
    with SkipClean():  # the faces are left unmerged after this step: merging them gives an invalid solid
        with BuildSketch(Plane(origin=(0, 15, 0), x_dir=(1, 0, 0), z_dir=(0, 1, 0))):
            with BuildLine():
                Line((64.511791502, 37.774024263), (66.511791502, 37.774024263))
                ThreePointArc((66.511791502, 37.774024263), (76.511791502, 47.774024263), (86.511791502, 37.774024263))
                Line((86.511791502, 37.774024263), (88.511791502, 37.774024263))
                ThreePointArc((88.511791502, 37.774024263), (76.511791502, 49.774024263), (64.511791502, 37.774024263))
            make_face()
        extrude(amount=-BOSS_EXTRUDE5_DEPTH)

    # Sketch9 → Cut-Extrude5 (cut)
    with SkipClean():  # the faces are left unmerged after this step: merging them gives an invalid solid
        with BuildSketch(Plane(origin=(0, 3, 0), x_dir=(1, 0, 0), z_dir=(0, 1, 0))):
            with BuildLine():
                Line((34.719854758, -55), (46.340443844, -55))
                Line((46.340443844, -55), (46.340443844, -47.3))
                Line((46.340443844, -47.3), (37.77394627, -47.3))
                ThreePointArc((37.77394627, -47.3), (36.264905061, -48.466665635), (34.719854758, -49.585206487))
                Line((34.719854758, -49.585206487), (34.719854758, -55))
            make_face()
        extrude(amount=-CUT_EXTRUDE5_DEPTH, mode=Mode.SUBTRACT)


solid = boss_extrude2_kept_piece.part
